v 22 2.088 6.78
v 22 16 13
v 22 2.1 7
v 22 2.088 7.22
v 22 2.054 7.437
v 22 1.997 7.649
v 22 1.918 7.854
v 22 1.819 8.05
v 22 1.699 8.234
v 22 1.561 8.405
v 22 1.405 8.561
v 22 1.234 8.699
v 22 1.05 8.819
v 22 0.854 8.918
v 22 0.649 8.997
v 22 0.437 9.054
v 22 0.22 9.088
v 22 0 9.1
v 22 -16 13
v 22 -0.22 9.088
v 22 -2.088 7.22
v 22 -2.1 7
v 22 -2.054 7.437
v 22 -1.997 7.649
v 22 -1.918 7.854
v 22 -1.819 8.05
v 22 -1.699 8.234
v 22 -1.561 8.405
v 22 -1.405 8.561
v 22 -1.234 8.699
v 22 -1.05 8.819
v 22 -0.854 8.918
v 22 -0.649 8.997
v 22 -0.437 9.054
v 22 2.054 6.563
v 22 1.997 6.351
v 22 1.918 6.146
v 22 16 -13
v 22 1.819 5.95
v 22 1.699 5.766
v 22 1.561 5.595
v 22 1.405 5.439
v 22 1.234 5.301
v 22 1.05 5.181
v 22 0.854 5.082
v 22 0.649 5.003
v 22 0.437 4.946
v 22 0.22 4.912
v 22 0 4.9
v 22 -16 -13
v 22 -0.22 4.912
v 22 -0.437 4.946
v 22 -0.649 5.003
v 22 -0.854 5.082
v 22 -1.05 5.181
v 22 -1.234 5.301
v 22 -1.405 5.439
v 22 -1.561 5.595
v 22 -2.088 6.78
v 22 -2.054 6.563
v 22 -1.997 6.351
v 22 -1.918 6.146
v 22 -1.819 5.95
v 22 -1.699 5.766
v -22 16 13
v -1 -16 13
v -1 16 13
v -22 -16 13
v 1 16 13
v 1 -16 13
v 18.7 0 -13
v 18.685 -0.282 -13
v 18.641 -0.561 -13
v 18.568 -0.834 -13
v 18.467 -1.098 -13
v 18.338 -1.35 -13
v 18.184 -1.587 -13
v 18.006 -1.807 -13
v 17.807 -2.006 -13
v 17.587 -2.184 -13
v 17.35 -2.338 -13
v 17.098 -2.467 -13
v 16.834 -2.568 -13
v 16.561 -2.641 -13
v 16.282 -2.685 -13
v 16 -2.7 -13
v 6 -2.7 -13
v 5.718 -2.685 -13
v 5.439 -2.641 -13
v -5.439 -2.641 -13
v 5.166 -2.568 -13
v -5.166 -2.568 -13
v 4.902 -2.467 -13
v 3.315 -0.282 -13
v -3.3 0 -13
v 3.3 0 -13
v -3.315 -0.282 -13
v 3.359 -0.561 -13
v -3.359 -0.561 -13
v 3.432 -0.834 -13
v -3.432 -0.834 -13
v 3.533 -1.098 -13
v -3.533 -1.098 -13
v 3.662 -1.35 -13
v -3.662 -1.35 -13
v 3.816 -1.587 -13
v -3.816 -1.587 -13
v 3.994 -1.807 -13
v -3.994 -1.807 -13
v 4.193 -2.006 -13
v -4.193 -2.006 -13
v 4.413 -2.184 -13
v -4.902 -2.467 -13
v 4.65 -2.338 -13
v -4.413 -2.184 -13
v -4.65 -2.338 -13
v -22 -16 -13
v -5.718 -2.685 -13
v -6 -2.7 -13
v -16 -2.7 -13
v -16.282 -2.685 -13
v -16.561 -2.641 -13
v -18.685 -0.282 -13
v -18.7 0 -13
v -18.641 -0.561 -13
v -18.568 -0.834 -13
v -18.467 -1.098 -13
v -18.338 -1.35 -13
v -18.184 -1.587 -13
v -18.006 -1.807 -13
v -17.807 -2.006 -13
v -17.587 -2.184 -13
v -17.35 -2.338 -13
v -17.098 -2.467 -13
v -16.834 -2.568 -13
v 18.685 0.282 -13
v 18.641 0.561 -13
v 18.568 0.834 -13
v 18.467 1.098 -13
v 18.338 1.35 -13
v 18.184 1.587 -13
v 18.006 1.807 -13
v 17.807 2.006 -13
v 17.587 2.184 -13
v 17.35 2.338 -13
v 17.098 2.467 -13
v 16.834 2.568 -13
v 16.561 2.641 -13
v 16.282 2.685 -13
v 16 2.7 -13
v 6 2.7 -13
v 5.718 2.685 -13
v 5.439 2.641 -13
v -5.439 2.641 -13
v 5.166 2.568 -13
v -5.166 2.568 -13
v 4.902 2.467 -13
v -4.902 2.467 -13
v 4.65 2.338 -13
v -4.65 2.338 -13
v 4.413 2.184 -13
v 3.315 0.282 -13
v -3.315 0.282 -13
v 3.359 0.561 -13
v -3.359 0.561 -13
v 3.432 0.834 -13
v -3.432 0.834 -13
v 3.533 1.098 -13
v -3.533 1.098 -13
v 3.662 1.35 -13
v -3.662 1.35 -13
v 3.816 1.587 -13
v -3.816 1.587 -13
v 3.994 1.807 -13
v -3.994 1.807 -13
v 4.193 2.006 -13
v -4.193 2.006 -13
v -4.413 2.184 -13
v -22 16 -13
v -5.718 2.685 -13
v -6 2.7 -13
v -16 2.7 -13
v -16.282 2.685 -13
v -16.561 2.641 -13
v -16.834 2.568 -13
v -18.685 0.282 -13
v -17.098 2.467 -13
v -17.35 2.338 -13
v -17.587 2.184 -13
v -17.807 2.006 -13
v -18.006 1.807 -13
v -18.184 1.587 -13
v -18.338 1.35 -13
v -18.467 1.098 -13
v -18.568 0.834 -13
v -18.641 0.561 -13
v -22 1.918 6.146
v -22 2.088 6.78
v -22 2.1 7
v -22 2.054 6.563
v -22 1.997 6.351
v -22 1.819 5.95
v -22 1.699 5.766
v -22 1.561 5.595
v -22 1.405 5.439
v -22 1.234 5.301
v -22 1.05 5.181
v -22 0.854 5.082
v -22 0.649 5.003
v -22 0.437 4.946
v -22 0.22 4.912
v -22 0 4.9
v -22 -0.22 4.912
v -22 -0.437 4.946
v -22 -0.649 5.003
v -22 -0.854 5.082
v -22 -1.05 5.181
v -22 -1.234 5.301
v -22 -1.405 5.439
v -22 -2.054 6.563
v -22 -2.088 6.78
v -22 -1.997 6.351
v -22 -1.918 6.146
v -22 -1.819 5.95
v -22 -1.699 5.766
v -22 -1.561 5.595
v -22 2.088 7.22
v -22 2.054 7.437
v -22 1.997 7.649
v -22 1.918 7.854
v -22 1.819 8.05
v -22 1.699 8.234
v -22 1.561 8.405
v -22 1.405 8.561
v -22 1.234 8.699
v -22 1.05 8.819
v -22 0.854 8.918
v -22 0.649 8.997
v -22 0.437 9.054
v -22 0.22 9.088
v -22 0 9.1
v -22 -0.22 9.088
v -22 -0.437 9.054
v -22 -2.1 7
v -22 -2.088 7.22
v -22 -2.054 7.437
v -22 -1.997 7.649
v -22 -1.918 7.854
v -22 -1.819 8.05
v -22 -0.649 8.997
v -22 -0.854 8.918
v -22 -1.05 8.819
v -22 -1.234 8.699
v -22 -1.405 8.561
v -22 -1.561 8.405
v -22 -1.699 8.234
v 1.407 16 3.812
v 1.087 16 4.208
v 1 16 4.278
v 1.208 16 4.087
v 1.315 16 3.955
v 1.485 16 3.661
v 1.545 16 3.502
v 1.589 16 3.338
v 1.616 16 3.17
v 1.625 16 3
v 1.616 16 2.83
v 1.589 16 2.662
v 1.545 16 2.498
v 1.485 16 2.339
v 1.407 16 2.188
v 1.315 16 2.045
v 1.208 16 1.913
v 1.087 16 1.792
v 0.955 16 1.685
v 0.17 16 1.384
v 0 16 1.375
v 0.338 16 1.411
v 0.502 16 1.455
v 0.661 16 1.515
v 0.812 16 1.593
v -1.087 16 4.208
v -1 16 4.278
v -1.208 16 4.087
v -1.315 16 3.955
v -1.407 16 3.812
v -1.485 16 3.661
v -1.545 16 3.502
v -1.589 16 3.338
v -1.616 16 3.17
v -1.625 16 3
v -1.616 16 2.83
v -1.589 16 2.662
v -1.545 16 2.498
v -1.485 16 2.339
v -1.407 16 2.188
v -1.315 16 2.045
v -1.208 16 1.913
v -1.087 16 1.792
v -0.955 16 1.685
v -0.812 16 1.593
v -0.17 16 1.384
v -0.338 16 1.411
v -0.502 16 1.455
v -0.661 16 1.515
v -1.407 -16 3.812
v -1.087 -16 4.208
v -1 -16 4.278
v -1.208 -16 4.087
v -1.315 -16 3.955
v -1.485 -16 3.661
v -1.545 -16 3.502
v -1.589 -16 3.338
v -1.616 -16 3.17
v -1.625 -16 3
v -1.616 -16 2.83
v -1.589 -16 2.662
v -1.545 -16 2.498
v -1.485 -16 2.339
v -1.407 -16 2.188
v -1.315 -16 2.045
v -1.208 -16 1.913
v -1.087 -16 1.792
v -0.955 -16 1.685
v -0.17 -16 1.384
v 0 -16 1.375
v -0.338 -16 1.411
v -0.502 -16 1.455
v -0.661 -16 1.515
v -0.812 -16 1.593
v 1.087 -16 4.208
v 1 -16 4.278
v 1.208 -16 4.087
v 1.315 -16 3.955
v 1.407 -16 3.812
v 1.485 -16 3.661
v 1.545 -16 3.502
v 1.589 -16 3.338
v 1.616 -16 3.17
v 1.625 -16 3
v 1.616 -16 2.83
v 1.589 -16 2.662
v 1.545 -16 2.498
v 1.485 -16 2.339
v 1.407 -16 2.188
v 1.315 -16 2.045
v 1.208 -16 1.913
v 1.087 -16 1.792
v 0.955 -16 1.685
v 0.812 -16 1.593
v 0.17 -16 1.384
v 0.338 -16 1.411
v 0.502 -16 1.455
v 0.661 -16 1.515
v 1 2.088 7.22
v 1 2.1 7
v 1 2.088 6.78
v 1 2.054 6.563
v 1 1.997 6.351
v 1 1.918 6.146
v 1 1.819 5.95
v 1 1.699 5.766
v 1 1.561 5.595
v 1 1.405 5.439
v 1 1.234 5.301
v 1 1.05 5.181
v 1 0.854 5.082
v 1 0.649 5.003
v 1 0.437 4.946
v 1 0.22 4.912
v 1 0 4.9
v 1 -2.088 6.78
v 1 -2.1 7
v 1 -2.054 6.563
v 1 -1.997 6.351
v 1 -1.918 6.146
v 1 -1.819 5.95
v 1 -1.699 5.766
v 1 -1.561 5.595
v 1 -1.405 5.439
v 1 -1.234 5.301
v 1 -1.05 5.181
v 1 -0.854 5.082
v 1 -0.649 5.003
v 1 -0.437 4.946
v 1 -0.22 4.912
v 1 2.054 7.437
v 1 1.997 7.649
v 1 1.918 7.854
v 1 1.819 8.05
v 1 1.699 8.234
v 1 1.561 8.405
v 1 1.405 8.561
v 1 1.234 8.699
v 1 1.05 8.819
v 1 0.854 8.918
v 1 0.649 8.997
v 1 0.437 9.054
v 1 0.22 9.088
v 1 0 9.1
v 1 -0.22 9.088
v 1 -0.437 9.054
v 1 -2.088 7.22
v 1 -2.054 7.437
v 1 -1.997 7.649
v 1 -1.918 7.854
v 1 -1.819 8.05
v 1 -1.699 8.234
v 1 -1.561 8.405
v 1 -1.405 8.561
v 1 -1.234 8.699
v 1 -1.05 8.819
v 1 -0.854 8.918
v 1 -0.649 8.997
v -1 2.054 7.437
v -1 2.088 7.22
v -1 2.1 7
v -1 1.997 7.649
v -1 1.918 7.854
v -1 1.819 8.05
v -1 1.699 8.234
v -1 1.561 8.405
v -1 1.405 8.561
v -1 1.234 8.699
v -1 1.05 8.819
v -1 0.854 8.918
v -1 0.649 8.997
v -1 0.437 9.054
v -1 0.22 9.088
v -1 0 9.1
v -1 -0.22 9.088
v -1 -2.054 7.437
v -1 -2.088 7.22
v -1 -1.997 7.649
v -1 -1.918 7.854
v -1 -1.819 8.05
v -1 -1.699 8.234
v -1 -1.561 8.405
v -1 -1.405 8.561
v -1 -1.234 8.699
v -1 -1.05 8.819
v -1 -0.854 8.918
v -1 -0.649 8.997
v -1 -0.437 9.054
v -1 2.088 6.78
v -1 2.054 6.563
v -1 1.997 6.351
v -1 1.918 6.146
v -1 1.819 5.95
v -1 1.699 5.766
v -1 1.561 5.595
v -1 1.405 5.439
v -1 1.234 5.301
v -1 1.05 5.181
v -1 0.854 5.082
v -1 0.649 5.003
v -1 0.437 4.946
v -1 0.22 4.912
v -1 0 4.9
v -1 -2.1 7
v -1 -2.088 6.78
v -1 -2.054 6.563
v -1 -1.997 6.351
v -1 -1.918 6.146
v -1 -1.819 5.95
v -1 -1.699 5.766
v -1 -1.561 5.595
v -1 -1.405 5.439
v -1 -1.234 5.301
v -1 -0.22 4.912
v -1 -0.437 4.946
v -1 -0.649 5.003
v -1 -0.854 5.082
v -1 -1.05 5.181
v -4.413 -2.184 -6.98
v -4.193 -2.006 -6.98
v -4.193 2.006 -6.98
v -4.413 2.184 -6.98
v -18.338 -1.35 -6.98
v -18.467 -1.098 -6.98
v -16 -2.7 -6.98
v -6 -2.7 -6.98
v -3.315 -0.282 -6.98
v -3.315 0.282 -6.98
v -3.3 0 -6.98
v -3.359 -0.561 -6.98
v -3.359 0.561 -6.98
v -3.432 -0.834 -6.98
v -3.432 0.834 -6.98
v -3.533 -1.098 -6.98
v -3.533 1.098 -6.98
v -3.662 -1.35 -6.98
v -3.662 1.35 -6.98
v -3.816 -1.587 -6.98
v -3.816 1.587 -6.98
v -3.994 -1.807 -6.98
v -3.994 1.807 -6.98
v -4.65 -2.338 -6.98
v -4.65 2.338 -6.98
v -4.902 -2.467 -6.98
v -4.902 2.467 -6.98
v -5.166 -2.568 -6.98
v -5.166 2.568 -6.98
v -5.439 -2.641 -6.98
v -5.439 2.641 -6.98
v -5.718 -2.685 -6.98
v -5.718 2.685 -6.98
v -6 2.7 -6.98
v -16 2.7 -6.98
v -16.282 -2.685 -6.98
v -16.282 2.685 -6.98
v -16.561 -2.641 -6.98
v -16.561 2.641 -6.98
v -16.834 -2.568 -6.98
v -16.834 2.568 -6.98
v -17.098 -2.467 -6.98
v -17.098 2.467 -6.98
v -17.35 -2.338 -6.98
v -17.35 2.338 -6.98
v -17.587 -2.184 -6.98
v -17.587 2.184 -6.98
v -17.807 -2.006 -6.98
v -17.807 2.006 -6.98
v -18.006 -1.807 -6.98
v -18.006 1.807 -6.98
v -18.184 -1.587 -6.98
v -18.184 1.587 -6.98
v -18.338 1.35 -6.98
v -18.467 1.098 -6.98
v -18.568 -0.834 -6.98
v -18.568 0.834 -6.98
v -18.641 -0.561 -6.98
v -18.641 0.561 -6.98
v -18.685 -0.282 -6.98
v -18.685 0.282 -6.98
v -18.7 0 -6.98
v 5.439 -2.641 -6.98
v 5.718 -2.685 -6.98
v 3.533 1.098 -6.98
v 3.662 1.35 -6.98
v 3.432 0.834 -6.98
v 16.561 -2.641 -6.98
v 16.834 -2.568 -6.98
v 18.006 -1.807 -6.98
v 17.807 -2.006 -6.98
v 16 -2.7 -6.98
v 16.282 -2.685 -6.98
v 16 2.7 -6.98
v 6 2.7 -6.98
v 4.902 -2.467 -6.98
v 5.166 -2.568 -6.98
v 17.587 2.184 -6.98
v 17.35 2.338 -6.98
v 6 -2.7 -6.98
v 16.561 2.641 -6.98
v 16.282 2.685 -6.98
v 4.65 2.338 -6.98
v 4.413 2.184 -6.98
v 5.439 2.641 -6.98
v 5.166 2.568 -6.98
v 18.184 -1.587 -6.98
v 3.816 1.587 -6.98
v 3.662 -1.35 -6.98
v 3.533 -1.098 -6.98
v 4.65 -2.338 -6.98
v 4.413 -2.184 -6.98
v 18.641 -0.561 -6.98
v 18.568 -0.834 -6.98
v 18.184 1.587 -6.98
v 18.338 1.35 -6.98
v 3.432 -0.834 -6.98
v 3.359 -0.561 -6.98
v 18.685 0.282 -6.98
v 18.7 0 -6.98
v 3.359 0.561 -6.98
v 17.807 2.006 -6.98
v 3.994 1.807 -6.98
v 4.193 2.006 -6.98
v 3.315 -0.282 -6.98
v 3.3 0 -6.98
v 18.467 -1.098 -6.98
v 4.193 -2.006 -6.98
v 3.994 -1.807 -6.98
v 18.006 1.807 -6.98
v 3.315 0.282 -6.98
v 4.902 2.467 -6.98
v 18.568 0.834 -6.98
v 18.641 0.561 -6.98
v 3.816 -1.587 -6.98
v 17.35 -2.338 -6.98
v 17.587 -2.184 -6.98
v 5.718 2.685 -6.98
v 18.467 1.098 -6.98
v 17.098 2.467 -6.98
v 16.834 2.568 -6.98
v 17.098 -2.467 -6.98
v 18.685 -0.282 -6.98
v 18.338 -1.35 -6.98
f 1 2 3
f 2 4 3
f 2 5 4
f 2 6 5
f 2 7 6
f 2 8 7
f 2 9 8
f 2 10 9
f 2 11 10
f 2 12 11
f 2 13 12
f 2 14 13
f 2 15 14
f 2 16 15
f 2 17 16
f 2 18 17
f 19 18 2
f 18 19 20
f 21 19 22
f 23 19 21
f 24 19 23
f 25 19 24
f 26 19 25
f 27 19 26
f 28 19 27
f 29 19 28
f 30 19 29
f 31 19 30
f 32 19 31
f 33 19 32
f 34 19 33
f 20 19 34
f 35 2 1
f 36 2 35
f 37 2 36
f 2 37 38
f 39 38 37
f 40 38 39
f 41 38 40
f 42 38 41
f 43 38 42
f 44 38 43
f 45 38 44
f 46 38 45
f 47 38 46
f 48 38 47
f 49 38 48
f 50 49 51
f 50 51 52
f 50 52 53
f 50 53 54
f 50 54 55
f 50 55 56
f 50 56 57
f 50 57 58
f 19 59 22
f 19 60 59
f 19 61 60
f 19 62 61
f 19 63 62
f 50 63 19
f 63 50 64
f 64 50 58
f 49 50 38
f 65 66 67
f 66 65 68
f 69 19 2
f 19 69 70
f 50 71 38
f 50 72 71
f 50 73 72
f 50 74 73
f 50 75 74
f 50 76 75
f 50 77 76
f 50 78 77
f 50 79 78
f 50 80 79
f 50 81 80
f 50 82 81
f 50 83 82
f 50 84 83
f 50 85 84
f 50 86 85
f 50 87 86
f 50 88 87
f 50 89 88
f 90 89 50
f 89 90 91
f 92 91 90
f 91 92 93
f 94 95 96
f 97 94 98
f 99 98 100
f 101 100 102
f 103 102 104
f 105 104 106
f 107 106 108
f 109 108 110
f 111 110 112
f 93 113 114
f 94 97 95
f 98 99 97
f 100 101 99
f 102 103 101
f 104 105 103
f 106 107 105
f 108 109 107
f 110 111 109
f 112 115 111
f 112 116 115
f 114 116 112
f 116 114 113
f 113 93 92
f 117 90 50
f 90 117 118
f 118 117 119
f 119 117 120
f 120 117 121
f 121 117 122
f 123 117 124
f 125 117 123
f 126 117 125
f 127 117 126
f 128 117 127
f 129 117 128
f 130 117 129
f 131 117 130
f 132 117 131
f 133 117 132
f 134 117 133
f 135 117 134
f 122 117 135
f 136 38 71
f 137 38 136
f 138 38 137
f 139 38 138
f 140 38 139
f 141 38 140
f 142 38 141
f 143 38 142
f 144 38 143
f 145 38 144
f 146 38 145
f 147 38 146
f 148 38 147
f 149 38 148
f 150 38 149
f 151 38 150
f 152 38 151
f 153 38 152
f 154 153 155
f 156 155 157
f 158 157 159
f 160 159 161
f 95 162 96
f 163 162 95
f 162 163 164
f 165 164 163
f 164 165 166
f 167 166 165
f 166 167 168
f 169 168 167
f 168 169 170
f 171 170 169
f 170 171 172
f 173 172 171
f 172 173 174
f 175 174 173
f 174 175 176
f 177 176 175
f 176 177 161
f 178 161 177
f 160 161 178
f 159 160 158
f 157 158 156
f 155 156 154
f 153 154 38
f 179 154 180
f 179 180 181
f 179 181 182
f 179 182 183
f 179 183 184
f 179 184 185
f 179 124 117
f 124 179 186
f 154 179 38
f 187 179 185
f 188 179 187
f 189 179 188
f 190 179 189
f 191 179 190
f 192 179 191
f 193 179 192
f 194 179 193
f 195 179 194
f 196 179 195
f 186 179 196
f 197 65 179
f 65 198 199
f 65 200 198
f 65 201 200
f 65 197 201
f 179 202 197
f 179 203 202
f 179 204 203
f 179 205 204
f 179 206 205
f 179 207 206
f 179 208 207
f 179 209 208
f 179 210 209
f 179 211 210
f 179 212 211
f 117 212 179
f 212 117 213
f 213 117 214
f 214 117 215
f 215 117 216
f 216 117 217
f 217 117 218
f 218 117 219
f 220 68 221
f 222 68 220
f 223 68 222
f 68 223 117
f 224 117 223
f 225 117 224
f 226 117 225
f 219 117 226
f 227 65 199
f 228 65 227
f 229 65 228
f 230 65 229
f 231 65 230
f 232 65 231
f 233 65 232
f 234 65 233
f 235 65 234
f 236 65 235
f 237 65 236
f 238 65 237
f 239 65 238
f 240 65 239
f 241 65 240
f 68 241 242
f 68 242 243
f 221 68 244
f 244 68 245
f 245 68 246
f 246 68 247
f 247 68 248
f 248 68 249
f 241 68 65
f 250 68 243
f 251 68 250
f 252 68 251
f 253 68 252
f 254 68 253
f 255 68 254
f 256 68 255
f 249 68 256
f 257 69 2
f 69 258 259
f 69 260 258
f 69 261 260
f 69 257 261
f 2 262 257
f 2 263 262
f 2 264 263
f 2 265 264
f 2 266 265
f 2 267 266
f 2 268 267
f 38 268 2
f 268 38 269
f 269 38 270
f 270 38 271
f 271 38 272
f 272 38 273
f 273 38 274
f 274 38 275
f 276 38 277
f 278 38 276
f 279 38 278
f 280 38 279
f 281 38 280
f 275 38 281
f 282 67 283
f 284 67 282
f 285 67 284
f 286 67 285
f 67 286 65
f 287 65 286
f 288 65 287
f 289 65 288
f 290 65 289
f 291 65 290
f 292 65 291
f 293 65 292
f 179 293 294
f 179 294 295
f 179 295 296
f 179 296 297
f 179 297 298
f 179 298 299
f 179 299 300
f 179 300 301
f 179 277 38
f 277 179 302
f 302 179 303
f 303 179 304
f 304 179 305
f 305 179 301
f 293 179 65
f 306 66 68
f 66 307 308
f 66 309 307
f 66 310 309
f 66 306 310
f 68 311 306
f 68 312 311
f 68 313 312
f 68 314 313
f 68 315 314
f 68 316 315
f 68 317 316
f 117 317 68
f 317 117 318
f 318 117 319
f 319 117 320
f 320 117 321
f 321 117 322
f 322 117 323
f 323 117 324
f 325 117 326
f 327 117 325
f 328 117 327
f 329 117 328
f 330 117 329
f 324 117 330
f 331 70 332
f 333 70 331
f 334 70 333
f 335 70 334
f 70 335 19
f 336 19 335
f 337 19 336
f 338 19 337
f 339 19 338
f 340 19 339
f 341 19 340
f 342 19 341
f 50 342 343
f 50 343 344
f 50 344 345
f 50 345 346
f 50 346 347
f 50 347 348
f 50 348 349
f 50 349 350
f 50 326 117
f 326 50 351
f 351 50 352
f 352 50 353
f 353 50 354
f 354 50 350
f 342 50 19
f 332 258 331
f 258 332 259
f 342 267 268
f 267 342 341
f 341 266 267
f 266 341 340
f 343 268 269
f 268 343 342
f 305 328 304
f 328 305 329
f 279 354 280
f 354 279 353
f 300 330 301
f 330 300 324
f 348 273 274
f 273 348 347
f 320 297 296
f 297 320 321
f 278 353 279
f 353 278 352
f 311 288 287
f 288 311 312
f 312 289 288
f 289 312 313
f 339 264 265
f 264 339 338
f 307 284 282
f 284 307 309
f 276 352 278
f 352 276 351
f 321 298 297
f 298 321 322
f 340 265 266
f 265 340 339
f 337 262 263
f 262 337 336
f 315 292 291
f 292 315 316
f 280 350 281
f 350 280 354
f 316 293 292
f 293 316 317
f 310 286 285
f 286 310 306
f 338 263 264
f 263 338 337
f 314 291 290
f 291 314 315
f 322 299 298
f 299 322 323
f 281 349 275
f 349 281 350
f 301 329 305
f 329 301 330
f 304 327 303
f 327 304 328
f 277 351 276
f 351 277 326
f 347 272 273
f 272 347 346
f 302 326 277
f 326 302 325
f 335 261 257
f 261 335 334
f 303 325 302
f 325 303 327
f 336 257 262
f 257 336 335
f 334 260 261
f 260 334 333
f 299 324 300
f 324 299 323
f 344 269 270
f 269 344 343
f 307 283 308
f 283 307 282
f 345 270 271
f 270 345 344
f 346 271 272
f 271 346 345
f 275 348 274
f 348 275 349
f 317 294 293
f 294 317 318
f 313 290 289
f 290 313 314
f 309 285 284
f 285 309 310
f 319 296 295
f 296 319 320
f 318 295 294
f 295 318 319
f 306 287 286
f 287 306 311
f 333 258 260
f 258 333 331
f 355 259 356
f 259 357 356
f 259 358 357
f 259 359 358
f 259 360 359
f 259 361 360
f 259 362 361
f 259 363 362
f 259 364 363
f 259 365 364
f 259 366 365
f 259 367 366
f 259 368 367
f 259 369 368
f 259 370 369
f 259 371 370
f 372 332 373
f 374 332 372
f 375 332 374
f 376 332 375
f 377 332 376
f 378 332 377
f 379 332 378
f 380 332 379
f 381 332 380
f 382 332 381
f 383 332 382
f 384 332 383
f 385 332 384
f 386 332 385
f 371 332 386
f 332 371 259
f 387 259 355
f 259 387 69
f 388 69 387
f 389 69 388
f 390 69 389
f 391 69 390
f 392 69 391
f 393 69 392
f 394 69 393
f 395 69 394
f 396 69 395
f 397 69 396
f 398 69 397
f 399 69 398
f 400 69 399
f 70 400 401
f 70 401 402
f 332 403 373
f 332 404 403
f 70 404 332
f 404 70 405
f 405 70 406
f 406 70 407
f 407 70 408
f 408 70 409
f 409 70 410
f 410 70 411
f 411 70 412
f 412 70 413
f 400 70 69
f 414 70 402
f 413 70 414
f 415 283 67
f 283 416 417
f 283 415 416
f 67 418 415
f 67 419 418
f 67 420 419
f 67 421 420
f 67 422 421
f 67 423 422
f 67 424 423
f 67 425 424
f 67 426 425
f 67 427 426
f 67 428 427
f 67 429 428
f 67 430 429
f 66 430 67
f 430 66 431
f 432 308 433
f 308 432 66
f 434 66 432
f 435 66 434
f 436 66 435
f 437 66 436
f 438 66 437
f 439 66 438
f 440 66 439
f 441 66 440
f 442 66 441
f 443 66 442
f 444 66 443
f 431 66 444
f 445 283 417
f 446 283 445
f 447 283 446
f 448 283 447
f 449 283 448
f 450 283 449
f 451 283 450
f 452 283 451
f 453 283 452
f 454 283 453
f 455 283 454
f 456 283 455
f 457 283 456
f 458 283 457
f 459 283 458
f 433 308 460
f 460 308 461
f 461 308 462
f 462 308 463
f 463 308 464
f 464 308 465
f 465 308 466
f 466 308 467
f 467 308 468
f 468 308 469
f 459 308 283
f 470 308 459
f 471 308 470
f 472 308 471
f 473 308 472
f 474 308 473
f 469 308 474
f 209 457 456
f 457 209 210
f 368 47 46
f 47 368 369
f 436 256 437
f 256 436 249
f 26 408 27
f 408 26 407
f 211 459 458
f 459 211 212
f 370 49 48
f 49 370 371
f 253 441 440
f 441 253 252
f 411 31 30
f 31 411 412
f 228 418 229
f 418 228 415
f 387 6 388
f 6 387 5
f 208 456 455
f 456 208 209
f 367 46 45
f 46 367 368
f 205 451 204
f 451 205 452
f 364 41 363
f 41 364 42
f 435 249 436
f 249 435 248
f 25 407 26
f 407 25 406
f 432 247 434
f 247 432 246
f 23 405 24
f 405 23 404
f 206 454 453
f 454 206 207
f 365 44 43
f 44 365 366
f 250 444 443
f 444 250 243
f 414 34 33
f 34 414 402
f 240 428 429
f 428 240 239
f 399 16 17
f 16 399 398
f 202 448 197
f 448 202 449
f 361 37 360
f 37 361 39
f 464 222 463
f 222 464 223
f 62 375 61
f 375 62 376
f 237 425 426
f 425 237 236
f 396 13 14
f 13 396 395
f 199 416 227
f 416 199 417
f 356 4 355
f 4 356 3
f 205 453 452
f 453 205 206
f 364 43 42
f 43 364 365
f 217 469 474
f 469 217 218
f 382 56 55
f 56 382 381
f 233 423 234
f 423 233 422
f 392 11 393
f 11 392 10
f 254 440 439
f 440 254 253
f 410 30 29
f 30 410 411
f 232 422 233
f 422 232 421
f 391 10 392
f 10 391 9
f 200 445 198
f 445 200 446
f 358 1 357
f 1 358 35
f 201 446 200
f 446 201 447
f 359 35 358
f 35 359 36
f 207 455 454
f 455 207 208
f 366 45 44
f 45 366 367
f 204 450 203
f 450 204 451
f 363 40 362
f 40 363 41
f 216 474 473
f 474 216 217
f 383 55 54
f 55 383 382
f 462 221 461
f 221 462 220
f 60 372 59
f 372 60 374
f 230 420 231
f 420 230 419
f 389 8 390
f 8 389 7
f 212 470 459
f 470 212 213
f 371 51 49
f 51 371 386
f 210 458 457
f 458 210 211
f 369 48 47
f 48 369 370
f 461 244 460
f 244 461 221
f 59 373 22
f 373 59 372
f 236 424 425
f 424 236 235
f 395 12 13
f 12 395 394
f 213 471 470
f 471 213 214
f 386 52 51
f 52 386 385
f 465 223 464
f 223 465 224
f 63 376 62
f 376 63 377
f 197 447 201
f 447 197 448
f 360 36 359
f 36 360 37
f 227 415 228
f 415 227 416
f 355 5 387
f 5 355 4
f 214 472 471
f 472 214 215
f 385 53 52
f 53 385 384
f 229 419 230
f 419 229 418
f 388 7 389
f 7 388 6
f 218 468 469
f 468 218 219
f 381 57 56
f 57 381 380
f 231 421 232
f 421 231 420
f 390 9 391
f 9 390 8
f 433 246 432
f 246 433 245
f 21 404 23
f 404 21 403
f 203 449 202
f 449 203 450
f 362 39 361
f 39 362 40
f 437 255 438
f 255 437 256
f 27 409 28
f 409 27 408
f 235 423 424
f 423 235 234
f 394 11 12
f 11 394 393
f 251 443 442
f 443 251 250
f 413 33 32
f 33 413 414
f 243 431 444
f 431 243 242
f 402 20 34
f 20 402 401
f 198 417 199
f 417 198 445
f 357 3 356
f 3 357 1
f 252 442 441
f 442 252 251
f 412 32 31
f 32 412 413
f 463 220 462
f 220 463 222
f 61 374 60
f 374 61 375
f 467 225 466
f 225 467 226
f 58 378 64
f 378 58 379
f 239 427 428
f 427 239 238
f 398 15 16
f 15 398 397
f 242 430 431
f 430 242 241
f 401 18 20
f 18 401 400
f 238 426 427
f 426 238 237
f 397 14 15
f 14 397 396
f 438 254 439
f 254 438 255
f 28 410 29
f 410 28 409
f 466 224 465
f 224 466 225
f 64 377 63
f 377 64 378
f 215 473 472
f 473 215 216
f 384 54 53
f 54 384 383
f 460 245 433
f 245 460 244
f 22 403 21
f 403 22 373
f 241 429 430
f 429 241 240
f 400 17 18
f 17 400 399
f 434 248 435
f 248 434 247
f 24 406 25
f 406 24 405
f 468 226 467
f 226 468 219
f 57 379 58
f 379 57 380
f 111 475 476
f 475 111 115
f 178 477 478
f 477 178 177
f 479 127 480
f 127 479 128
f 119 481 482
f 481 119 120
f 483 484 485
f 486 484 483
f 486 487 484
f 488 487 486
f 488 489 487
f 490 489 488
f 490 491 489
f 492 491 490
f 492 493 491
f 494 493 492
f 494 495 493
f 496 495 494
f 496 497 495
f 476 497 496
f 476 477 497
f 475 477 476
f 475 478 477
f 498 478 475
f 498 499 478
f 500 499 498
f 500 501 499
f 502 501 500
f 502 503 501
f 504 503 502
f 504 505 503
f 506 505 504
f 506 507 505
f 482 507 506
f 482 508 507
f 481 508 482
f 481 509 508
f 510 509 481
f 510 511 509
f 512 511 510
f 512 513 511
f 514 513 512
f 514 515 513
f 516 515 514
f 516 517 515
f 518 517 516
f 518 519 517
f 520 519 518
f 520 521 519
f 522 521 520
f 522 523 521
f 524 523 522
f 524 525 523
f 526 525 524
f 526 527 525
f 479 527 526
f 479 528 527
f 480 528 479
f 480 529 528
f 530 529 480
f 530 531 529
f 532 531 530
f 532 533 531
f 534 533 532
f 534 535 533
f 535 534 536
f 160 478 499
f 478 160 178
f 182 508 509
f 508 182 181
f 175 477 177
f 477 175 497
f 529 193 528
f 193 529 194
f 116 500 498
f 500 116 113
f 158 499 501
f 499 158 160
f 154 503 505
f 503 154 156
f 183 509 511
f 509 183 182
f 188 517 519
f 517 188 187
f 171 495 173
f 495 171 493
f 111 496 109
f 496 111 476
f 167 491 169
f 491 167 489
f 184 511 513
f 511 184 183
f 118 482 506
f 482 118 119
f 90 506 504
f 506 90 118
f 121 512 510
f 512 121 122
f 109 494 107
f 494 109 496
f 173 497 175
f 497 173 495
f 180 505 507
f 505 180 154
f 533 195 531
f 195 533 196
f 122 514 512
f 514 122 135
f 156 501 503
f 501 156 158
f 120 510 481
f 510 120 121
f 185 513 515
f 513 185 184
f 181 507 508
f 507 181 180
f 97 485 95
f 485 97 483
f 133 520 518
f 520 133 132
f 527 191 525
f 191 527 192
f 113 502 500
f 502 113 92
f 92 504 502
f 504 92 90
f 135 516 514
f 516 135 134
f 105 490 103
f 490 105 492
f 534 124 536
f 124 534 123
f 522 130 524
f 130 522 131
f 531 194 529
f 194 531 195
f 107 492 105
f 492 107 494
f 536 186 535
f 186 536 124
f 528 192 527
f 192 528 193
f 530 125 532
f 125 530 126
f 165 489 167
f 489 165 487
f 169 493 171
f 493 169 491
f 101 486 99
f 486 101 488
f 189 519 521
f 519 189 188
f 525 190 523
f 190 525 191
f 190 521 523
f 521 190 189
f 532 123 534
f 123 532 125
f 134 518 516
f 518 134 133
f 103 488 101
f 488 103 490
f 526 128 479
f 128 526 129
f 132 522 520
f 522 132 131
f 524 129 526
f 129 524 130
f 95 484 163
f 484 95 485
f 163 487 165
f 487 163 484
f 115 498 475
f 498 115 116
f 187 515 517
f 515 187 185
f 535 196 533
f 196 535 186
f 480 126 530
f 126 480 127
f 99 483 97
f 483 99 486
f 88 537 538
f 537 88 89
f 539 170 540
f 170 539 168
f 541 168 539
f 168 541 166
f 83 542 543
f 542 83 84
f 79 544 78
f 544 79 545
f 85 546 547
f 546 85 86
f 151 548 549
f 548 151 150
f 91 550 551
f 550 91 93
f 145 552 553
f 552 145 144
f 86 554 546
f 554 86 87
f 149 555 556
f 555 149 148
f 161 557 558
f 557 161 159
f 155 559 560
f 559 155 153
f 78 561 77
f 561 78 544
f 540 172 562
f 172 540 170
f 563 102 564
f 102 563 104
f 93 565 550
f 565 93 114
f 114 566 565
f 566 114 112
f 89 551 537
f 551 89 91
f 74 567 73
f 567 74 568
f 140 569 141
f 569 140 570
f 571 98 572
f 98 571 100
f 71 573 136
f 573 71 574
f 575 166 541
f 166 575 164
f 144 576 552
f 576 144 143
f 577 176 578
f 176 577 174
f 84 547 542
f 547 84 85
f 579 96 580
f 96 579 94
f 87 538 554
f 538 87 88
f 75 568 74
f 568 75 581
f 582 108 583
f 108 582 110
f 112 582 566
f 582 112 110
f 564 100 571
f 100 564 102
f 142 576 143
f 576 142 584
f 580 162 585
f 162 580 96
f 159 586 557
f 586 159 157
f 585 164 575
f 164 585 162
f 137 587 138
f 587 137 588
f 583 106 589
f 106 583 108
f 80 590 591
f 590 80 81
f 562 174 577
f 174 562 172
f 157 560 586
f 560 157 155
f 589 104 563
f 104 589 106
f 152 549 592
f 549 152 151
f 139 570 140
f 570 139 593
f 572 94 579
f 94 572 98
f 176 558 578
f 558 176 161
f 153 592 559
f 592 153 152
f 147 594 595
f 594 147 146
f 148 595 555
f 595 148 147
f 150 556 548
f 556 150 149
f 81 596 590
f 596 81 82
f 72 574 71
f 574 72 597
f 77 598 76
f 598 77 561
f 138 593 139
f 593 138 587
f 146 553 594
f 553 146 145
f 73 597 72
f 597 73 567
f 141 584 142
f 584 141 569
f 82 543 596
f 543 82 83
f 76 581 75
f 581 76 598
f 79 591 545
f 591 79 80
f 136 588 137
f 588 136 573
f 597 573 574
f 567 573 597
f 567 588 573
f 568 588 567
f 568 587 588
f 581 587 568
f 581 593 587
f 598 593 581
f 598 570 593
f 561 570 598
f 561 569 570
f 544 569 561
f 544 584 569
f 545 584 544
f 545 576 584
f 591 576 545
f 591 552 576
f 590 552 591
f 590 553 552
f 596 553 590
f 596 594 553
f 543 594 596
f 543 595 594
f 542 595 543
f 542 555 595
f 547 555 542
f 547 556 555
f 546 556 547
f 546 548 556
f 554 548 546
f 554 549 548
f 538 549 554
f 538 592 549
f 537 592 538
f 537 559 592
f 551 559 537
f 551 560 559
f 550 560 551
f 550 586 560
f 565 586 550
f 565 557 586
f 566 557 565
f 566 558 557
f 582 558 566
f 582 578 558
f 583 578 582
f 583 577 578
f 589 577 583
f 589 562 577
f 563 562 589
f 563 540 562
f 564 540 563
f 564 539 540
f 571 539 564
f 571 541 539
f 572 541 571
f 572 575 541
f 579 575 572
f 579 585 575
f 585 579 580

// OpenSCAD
// Clamp pedestal for 3 mm shaft.
$fn = 60;
eps = 0.02;
shaft_d = 3;
body_l = 44;
body_d = 32;
body_h = 26;
base_t = 6;
slot_w = 2;
mount_d = 5.4;
module mount_slot(x) {
    hull() {
        translate([x - 5, 0, -body_h / 2 - eps]) cylinder(d = mount_d, h = base_t + 2 * eps);
        translate([x + 5, 0, -body_h / 2 - eps]) cylinder(d = mount_d, h = base_t + 2 * eps);
    }
}
difference() {
    cube([body_l, body_d, body_h], center = true);
    translate([0, -body_d / 2 - eps, 3]) rotate([-90, 0, 0]) cylinder(d = shaft_d + 0.25, h = body_d + 2 * eps);
    translate([-slot_w / 2, -body_d / 2 - eps, 3]) cube([slot_w, body_d + 2 * eps, body_h / 2 + eps]);
    translate([-body_l / 2 - eps, 0, body_h / 2 - 6]) rotate([0, 90, 0]) cylinder(d = 4.2, h = body_l + 2 * eps);
    mount_slot(-body_l / 4);
    mount_slot(body_l / 4);
}
